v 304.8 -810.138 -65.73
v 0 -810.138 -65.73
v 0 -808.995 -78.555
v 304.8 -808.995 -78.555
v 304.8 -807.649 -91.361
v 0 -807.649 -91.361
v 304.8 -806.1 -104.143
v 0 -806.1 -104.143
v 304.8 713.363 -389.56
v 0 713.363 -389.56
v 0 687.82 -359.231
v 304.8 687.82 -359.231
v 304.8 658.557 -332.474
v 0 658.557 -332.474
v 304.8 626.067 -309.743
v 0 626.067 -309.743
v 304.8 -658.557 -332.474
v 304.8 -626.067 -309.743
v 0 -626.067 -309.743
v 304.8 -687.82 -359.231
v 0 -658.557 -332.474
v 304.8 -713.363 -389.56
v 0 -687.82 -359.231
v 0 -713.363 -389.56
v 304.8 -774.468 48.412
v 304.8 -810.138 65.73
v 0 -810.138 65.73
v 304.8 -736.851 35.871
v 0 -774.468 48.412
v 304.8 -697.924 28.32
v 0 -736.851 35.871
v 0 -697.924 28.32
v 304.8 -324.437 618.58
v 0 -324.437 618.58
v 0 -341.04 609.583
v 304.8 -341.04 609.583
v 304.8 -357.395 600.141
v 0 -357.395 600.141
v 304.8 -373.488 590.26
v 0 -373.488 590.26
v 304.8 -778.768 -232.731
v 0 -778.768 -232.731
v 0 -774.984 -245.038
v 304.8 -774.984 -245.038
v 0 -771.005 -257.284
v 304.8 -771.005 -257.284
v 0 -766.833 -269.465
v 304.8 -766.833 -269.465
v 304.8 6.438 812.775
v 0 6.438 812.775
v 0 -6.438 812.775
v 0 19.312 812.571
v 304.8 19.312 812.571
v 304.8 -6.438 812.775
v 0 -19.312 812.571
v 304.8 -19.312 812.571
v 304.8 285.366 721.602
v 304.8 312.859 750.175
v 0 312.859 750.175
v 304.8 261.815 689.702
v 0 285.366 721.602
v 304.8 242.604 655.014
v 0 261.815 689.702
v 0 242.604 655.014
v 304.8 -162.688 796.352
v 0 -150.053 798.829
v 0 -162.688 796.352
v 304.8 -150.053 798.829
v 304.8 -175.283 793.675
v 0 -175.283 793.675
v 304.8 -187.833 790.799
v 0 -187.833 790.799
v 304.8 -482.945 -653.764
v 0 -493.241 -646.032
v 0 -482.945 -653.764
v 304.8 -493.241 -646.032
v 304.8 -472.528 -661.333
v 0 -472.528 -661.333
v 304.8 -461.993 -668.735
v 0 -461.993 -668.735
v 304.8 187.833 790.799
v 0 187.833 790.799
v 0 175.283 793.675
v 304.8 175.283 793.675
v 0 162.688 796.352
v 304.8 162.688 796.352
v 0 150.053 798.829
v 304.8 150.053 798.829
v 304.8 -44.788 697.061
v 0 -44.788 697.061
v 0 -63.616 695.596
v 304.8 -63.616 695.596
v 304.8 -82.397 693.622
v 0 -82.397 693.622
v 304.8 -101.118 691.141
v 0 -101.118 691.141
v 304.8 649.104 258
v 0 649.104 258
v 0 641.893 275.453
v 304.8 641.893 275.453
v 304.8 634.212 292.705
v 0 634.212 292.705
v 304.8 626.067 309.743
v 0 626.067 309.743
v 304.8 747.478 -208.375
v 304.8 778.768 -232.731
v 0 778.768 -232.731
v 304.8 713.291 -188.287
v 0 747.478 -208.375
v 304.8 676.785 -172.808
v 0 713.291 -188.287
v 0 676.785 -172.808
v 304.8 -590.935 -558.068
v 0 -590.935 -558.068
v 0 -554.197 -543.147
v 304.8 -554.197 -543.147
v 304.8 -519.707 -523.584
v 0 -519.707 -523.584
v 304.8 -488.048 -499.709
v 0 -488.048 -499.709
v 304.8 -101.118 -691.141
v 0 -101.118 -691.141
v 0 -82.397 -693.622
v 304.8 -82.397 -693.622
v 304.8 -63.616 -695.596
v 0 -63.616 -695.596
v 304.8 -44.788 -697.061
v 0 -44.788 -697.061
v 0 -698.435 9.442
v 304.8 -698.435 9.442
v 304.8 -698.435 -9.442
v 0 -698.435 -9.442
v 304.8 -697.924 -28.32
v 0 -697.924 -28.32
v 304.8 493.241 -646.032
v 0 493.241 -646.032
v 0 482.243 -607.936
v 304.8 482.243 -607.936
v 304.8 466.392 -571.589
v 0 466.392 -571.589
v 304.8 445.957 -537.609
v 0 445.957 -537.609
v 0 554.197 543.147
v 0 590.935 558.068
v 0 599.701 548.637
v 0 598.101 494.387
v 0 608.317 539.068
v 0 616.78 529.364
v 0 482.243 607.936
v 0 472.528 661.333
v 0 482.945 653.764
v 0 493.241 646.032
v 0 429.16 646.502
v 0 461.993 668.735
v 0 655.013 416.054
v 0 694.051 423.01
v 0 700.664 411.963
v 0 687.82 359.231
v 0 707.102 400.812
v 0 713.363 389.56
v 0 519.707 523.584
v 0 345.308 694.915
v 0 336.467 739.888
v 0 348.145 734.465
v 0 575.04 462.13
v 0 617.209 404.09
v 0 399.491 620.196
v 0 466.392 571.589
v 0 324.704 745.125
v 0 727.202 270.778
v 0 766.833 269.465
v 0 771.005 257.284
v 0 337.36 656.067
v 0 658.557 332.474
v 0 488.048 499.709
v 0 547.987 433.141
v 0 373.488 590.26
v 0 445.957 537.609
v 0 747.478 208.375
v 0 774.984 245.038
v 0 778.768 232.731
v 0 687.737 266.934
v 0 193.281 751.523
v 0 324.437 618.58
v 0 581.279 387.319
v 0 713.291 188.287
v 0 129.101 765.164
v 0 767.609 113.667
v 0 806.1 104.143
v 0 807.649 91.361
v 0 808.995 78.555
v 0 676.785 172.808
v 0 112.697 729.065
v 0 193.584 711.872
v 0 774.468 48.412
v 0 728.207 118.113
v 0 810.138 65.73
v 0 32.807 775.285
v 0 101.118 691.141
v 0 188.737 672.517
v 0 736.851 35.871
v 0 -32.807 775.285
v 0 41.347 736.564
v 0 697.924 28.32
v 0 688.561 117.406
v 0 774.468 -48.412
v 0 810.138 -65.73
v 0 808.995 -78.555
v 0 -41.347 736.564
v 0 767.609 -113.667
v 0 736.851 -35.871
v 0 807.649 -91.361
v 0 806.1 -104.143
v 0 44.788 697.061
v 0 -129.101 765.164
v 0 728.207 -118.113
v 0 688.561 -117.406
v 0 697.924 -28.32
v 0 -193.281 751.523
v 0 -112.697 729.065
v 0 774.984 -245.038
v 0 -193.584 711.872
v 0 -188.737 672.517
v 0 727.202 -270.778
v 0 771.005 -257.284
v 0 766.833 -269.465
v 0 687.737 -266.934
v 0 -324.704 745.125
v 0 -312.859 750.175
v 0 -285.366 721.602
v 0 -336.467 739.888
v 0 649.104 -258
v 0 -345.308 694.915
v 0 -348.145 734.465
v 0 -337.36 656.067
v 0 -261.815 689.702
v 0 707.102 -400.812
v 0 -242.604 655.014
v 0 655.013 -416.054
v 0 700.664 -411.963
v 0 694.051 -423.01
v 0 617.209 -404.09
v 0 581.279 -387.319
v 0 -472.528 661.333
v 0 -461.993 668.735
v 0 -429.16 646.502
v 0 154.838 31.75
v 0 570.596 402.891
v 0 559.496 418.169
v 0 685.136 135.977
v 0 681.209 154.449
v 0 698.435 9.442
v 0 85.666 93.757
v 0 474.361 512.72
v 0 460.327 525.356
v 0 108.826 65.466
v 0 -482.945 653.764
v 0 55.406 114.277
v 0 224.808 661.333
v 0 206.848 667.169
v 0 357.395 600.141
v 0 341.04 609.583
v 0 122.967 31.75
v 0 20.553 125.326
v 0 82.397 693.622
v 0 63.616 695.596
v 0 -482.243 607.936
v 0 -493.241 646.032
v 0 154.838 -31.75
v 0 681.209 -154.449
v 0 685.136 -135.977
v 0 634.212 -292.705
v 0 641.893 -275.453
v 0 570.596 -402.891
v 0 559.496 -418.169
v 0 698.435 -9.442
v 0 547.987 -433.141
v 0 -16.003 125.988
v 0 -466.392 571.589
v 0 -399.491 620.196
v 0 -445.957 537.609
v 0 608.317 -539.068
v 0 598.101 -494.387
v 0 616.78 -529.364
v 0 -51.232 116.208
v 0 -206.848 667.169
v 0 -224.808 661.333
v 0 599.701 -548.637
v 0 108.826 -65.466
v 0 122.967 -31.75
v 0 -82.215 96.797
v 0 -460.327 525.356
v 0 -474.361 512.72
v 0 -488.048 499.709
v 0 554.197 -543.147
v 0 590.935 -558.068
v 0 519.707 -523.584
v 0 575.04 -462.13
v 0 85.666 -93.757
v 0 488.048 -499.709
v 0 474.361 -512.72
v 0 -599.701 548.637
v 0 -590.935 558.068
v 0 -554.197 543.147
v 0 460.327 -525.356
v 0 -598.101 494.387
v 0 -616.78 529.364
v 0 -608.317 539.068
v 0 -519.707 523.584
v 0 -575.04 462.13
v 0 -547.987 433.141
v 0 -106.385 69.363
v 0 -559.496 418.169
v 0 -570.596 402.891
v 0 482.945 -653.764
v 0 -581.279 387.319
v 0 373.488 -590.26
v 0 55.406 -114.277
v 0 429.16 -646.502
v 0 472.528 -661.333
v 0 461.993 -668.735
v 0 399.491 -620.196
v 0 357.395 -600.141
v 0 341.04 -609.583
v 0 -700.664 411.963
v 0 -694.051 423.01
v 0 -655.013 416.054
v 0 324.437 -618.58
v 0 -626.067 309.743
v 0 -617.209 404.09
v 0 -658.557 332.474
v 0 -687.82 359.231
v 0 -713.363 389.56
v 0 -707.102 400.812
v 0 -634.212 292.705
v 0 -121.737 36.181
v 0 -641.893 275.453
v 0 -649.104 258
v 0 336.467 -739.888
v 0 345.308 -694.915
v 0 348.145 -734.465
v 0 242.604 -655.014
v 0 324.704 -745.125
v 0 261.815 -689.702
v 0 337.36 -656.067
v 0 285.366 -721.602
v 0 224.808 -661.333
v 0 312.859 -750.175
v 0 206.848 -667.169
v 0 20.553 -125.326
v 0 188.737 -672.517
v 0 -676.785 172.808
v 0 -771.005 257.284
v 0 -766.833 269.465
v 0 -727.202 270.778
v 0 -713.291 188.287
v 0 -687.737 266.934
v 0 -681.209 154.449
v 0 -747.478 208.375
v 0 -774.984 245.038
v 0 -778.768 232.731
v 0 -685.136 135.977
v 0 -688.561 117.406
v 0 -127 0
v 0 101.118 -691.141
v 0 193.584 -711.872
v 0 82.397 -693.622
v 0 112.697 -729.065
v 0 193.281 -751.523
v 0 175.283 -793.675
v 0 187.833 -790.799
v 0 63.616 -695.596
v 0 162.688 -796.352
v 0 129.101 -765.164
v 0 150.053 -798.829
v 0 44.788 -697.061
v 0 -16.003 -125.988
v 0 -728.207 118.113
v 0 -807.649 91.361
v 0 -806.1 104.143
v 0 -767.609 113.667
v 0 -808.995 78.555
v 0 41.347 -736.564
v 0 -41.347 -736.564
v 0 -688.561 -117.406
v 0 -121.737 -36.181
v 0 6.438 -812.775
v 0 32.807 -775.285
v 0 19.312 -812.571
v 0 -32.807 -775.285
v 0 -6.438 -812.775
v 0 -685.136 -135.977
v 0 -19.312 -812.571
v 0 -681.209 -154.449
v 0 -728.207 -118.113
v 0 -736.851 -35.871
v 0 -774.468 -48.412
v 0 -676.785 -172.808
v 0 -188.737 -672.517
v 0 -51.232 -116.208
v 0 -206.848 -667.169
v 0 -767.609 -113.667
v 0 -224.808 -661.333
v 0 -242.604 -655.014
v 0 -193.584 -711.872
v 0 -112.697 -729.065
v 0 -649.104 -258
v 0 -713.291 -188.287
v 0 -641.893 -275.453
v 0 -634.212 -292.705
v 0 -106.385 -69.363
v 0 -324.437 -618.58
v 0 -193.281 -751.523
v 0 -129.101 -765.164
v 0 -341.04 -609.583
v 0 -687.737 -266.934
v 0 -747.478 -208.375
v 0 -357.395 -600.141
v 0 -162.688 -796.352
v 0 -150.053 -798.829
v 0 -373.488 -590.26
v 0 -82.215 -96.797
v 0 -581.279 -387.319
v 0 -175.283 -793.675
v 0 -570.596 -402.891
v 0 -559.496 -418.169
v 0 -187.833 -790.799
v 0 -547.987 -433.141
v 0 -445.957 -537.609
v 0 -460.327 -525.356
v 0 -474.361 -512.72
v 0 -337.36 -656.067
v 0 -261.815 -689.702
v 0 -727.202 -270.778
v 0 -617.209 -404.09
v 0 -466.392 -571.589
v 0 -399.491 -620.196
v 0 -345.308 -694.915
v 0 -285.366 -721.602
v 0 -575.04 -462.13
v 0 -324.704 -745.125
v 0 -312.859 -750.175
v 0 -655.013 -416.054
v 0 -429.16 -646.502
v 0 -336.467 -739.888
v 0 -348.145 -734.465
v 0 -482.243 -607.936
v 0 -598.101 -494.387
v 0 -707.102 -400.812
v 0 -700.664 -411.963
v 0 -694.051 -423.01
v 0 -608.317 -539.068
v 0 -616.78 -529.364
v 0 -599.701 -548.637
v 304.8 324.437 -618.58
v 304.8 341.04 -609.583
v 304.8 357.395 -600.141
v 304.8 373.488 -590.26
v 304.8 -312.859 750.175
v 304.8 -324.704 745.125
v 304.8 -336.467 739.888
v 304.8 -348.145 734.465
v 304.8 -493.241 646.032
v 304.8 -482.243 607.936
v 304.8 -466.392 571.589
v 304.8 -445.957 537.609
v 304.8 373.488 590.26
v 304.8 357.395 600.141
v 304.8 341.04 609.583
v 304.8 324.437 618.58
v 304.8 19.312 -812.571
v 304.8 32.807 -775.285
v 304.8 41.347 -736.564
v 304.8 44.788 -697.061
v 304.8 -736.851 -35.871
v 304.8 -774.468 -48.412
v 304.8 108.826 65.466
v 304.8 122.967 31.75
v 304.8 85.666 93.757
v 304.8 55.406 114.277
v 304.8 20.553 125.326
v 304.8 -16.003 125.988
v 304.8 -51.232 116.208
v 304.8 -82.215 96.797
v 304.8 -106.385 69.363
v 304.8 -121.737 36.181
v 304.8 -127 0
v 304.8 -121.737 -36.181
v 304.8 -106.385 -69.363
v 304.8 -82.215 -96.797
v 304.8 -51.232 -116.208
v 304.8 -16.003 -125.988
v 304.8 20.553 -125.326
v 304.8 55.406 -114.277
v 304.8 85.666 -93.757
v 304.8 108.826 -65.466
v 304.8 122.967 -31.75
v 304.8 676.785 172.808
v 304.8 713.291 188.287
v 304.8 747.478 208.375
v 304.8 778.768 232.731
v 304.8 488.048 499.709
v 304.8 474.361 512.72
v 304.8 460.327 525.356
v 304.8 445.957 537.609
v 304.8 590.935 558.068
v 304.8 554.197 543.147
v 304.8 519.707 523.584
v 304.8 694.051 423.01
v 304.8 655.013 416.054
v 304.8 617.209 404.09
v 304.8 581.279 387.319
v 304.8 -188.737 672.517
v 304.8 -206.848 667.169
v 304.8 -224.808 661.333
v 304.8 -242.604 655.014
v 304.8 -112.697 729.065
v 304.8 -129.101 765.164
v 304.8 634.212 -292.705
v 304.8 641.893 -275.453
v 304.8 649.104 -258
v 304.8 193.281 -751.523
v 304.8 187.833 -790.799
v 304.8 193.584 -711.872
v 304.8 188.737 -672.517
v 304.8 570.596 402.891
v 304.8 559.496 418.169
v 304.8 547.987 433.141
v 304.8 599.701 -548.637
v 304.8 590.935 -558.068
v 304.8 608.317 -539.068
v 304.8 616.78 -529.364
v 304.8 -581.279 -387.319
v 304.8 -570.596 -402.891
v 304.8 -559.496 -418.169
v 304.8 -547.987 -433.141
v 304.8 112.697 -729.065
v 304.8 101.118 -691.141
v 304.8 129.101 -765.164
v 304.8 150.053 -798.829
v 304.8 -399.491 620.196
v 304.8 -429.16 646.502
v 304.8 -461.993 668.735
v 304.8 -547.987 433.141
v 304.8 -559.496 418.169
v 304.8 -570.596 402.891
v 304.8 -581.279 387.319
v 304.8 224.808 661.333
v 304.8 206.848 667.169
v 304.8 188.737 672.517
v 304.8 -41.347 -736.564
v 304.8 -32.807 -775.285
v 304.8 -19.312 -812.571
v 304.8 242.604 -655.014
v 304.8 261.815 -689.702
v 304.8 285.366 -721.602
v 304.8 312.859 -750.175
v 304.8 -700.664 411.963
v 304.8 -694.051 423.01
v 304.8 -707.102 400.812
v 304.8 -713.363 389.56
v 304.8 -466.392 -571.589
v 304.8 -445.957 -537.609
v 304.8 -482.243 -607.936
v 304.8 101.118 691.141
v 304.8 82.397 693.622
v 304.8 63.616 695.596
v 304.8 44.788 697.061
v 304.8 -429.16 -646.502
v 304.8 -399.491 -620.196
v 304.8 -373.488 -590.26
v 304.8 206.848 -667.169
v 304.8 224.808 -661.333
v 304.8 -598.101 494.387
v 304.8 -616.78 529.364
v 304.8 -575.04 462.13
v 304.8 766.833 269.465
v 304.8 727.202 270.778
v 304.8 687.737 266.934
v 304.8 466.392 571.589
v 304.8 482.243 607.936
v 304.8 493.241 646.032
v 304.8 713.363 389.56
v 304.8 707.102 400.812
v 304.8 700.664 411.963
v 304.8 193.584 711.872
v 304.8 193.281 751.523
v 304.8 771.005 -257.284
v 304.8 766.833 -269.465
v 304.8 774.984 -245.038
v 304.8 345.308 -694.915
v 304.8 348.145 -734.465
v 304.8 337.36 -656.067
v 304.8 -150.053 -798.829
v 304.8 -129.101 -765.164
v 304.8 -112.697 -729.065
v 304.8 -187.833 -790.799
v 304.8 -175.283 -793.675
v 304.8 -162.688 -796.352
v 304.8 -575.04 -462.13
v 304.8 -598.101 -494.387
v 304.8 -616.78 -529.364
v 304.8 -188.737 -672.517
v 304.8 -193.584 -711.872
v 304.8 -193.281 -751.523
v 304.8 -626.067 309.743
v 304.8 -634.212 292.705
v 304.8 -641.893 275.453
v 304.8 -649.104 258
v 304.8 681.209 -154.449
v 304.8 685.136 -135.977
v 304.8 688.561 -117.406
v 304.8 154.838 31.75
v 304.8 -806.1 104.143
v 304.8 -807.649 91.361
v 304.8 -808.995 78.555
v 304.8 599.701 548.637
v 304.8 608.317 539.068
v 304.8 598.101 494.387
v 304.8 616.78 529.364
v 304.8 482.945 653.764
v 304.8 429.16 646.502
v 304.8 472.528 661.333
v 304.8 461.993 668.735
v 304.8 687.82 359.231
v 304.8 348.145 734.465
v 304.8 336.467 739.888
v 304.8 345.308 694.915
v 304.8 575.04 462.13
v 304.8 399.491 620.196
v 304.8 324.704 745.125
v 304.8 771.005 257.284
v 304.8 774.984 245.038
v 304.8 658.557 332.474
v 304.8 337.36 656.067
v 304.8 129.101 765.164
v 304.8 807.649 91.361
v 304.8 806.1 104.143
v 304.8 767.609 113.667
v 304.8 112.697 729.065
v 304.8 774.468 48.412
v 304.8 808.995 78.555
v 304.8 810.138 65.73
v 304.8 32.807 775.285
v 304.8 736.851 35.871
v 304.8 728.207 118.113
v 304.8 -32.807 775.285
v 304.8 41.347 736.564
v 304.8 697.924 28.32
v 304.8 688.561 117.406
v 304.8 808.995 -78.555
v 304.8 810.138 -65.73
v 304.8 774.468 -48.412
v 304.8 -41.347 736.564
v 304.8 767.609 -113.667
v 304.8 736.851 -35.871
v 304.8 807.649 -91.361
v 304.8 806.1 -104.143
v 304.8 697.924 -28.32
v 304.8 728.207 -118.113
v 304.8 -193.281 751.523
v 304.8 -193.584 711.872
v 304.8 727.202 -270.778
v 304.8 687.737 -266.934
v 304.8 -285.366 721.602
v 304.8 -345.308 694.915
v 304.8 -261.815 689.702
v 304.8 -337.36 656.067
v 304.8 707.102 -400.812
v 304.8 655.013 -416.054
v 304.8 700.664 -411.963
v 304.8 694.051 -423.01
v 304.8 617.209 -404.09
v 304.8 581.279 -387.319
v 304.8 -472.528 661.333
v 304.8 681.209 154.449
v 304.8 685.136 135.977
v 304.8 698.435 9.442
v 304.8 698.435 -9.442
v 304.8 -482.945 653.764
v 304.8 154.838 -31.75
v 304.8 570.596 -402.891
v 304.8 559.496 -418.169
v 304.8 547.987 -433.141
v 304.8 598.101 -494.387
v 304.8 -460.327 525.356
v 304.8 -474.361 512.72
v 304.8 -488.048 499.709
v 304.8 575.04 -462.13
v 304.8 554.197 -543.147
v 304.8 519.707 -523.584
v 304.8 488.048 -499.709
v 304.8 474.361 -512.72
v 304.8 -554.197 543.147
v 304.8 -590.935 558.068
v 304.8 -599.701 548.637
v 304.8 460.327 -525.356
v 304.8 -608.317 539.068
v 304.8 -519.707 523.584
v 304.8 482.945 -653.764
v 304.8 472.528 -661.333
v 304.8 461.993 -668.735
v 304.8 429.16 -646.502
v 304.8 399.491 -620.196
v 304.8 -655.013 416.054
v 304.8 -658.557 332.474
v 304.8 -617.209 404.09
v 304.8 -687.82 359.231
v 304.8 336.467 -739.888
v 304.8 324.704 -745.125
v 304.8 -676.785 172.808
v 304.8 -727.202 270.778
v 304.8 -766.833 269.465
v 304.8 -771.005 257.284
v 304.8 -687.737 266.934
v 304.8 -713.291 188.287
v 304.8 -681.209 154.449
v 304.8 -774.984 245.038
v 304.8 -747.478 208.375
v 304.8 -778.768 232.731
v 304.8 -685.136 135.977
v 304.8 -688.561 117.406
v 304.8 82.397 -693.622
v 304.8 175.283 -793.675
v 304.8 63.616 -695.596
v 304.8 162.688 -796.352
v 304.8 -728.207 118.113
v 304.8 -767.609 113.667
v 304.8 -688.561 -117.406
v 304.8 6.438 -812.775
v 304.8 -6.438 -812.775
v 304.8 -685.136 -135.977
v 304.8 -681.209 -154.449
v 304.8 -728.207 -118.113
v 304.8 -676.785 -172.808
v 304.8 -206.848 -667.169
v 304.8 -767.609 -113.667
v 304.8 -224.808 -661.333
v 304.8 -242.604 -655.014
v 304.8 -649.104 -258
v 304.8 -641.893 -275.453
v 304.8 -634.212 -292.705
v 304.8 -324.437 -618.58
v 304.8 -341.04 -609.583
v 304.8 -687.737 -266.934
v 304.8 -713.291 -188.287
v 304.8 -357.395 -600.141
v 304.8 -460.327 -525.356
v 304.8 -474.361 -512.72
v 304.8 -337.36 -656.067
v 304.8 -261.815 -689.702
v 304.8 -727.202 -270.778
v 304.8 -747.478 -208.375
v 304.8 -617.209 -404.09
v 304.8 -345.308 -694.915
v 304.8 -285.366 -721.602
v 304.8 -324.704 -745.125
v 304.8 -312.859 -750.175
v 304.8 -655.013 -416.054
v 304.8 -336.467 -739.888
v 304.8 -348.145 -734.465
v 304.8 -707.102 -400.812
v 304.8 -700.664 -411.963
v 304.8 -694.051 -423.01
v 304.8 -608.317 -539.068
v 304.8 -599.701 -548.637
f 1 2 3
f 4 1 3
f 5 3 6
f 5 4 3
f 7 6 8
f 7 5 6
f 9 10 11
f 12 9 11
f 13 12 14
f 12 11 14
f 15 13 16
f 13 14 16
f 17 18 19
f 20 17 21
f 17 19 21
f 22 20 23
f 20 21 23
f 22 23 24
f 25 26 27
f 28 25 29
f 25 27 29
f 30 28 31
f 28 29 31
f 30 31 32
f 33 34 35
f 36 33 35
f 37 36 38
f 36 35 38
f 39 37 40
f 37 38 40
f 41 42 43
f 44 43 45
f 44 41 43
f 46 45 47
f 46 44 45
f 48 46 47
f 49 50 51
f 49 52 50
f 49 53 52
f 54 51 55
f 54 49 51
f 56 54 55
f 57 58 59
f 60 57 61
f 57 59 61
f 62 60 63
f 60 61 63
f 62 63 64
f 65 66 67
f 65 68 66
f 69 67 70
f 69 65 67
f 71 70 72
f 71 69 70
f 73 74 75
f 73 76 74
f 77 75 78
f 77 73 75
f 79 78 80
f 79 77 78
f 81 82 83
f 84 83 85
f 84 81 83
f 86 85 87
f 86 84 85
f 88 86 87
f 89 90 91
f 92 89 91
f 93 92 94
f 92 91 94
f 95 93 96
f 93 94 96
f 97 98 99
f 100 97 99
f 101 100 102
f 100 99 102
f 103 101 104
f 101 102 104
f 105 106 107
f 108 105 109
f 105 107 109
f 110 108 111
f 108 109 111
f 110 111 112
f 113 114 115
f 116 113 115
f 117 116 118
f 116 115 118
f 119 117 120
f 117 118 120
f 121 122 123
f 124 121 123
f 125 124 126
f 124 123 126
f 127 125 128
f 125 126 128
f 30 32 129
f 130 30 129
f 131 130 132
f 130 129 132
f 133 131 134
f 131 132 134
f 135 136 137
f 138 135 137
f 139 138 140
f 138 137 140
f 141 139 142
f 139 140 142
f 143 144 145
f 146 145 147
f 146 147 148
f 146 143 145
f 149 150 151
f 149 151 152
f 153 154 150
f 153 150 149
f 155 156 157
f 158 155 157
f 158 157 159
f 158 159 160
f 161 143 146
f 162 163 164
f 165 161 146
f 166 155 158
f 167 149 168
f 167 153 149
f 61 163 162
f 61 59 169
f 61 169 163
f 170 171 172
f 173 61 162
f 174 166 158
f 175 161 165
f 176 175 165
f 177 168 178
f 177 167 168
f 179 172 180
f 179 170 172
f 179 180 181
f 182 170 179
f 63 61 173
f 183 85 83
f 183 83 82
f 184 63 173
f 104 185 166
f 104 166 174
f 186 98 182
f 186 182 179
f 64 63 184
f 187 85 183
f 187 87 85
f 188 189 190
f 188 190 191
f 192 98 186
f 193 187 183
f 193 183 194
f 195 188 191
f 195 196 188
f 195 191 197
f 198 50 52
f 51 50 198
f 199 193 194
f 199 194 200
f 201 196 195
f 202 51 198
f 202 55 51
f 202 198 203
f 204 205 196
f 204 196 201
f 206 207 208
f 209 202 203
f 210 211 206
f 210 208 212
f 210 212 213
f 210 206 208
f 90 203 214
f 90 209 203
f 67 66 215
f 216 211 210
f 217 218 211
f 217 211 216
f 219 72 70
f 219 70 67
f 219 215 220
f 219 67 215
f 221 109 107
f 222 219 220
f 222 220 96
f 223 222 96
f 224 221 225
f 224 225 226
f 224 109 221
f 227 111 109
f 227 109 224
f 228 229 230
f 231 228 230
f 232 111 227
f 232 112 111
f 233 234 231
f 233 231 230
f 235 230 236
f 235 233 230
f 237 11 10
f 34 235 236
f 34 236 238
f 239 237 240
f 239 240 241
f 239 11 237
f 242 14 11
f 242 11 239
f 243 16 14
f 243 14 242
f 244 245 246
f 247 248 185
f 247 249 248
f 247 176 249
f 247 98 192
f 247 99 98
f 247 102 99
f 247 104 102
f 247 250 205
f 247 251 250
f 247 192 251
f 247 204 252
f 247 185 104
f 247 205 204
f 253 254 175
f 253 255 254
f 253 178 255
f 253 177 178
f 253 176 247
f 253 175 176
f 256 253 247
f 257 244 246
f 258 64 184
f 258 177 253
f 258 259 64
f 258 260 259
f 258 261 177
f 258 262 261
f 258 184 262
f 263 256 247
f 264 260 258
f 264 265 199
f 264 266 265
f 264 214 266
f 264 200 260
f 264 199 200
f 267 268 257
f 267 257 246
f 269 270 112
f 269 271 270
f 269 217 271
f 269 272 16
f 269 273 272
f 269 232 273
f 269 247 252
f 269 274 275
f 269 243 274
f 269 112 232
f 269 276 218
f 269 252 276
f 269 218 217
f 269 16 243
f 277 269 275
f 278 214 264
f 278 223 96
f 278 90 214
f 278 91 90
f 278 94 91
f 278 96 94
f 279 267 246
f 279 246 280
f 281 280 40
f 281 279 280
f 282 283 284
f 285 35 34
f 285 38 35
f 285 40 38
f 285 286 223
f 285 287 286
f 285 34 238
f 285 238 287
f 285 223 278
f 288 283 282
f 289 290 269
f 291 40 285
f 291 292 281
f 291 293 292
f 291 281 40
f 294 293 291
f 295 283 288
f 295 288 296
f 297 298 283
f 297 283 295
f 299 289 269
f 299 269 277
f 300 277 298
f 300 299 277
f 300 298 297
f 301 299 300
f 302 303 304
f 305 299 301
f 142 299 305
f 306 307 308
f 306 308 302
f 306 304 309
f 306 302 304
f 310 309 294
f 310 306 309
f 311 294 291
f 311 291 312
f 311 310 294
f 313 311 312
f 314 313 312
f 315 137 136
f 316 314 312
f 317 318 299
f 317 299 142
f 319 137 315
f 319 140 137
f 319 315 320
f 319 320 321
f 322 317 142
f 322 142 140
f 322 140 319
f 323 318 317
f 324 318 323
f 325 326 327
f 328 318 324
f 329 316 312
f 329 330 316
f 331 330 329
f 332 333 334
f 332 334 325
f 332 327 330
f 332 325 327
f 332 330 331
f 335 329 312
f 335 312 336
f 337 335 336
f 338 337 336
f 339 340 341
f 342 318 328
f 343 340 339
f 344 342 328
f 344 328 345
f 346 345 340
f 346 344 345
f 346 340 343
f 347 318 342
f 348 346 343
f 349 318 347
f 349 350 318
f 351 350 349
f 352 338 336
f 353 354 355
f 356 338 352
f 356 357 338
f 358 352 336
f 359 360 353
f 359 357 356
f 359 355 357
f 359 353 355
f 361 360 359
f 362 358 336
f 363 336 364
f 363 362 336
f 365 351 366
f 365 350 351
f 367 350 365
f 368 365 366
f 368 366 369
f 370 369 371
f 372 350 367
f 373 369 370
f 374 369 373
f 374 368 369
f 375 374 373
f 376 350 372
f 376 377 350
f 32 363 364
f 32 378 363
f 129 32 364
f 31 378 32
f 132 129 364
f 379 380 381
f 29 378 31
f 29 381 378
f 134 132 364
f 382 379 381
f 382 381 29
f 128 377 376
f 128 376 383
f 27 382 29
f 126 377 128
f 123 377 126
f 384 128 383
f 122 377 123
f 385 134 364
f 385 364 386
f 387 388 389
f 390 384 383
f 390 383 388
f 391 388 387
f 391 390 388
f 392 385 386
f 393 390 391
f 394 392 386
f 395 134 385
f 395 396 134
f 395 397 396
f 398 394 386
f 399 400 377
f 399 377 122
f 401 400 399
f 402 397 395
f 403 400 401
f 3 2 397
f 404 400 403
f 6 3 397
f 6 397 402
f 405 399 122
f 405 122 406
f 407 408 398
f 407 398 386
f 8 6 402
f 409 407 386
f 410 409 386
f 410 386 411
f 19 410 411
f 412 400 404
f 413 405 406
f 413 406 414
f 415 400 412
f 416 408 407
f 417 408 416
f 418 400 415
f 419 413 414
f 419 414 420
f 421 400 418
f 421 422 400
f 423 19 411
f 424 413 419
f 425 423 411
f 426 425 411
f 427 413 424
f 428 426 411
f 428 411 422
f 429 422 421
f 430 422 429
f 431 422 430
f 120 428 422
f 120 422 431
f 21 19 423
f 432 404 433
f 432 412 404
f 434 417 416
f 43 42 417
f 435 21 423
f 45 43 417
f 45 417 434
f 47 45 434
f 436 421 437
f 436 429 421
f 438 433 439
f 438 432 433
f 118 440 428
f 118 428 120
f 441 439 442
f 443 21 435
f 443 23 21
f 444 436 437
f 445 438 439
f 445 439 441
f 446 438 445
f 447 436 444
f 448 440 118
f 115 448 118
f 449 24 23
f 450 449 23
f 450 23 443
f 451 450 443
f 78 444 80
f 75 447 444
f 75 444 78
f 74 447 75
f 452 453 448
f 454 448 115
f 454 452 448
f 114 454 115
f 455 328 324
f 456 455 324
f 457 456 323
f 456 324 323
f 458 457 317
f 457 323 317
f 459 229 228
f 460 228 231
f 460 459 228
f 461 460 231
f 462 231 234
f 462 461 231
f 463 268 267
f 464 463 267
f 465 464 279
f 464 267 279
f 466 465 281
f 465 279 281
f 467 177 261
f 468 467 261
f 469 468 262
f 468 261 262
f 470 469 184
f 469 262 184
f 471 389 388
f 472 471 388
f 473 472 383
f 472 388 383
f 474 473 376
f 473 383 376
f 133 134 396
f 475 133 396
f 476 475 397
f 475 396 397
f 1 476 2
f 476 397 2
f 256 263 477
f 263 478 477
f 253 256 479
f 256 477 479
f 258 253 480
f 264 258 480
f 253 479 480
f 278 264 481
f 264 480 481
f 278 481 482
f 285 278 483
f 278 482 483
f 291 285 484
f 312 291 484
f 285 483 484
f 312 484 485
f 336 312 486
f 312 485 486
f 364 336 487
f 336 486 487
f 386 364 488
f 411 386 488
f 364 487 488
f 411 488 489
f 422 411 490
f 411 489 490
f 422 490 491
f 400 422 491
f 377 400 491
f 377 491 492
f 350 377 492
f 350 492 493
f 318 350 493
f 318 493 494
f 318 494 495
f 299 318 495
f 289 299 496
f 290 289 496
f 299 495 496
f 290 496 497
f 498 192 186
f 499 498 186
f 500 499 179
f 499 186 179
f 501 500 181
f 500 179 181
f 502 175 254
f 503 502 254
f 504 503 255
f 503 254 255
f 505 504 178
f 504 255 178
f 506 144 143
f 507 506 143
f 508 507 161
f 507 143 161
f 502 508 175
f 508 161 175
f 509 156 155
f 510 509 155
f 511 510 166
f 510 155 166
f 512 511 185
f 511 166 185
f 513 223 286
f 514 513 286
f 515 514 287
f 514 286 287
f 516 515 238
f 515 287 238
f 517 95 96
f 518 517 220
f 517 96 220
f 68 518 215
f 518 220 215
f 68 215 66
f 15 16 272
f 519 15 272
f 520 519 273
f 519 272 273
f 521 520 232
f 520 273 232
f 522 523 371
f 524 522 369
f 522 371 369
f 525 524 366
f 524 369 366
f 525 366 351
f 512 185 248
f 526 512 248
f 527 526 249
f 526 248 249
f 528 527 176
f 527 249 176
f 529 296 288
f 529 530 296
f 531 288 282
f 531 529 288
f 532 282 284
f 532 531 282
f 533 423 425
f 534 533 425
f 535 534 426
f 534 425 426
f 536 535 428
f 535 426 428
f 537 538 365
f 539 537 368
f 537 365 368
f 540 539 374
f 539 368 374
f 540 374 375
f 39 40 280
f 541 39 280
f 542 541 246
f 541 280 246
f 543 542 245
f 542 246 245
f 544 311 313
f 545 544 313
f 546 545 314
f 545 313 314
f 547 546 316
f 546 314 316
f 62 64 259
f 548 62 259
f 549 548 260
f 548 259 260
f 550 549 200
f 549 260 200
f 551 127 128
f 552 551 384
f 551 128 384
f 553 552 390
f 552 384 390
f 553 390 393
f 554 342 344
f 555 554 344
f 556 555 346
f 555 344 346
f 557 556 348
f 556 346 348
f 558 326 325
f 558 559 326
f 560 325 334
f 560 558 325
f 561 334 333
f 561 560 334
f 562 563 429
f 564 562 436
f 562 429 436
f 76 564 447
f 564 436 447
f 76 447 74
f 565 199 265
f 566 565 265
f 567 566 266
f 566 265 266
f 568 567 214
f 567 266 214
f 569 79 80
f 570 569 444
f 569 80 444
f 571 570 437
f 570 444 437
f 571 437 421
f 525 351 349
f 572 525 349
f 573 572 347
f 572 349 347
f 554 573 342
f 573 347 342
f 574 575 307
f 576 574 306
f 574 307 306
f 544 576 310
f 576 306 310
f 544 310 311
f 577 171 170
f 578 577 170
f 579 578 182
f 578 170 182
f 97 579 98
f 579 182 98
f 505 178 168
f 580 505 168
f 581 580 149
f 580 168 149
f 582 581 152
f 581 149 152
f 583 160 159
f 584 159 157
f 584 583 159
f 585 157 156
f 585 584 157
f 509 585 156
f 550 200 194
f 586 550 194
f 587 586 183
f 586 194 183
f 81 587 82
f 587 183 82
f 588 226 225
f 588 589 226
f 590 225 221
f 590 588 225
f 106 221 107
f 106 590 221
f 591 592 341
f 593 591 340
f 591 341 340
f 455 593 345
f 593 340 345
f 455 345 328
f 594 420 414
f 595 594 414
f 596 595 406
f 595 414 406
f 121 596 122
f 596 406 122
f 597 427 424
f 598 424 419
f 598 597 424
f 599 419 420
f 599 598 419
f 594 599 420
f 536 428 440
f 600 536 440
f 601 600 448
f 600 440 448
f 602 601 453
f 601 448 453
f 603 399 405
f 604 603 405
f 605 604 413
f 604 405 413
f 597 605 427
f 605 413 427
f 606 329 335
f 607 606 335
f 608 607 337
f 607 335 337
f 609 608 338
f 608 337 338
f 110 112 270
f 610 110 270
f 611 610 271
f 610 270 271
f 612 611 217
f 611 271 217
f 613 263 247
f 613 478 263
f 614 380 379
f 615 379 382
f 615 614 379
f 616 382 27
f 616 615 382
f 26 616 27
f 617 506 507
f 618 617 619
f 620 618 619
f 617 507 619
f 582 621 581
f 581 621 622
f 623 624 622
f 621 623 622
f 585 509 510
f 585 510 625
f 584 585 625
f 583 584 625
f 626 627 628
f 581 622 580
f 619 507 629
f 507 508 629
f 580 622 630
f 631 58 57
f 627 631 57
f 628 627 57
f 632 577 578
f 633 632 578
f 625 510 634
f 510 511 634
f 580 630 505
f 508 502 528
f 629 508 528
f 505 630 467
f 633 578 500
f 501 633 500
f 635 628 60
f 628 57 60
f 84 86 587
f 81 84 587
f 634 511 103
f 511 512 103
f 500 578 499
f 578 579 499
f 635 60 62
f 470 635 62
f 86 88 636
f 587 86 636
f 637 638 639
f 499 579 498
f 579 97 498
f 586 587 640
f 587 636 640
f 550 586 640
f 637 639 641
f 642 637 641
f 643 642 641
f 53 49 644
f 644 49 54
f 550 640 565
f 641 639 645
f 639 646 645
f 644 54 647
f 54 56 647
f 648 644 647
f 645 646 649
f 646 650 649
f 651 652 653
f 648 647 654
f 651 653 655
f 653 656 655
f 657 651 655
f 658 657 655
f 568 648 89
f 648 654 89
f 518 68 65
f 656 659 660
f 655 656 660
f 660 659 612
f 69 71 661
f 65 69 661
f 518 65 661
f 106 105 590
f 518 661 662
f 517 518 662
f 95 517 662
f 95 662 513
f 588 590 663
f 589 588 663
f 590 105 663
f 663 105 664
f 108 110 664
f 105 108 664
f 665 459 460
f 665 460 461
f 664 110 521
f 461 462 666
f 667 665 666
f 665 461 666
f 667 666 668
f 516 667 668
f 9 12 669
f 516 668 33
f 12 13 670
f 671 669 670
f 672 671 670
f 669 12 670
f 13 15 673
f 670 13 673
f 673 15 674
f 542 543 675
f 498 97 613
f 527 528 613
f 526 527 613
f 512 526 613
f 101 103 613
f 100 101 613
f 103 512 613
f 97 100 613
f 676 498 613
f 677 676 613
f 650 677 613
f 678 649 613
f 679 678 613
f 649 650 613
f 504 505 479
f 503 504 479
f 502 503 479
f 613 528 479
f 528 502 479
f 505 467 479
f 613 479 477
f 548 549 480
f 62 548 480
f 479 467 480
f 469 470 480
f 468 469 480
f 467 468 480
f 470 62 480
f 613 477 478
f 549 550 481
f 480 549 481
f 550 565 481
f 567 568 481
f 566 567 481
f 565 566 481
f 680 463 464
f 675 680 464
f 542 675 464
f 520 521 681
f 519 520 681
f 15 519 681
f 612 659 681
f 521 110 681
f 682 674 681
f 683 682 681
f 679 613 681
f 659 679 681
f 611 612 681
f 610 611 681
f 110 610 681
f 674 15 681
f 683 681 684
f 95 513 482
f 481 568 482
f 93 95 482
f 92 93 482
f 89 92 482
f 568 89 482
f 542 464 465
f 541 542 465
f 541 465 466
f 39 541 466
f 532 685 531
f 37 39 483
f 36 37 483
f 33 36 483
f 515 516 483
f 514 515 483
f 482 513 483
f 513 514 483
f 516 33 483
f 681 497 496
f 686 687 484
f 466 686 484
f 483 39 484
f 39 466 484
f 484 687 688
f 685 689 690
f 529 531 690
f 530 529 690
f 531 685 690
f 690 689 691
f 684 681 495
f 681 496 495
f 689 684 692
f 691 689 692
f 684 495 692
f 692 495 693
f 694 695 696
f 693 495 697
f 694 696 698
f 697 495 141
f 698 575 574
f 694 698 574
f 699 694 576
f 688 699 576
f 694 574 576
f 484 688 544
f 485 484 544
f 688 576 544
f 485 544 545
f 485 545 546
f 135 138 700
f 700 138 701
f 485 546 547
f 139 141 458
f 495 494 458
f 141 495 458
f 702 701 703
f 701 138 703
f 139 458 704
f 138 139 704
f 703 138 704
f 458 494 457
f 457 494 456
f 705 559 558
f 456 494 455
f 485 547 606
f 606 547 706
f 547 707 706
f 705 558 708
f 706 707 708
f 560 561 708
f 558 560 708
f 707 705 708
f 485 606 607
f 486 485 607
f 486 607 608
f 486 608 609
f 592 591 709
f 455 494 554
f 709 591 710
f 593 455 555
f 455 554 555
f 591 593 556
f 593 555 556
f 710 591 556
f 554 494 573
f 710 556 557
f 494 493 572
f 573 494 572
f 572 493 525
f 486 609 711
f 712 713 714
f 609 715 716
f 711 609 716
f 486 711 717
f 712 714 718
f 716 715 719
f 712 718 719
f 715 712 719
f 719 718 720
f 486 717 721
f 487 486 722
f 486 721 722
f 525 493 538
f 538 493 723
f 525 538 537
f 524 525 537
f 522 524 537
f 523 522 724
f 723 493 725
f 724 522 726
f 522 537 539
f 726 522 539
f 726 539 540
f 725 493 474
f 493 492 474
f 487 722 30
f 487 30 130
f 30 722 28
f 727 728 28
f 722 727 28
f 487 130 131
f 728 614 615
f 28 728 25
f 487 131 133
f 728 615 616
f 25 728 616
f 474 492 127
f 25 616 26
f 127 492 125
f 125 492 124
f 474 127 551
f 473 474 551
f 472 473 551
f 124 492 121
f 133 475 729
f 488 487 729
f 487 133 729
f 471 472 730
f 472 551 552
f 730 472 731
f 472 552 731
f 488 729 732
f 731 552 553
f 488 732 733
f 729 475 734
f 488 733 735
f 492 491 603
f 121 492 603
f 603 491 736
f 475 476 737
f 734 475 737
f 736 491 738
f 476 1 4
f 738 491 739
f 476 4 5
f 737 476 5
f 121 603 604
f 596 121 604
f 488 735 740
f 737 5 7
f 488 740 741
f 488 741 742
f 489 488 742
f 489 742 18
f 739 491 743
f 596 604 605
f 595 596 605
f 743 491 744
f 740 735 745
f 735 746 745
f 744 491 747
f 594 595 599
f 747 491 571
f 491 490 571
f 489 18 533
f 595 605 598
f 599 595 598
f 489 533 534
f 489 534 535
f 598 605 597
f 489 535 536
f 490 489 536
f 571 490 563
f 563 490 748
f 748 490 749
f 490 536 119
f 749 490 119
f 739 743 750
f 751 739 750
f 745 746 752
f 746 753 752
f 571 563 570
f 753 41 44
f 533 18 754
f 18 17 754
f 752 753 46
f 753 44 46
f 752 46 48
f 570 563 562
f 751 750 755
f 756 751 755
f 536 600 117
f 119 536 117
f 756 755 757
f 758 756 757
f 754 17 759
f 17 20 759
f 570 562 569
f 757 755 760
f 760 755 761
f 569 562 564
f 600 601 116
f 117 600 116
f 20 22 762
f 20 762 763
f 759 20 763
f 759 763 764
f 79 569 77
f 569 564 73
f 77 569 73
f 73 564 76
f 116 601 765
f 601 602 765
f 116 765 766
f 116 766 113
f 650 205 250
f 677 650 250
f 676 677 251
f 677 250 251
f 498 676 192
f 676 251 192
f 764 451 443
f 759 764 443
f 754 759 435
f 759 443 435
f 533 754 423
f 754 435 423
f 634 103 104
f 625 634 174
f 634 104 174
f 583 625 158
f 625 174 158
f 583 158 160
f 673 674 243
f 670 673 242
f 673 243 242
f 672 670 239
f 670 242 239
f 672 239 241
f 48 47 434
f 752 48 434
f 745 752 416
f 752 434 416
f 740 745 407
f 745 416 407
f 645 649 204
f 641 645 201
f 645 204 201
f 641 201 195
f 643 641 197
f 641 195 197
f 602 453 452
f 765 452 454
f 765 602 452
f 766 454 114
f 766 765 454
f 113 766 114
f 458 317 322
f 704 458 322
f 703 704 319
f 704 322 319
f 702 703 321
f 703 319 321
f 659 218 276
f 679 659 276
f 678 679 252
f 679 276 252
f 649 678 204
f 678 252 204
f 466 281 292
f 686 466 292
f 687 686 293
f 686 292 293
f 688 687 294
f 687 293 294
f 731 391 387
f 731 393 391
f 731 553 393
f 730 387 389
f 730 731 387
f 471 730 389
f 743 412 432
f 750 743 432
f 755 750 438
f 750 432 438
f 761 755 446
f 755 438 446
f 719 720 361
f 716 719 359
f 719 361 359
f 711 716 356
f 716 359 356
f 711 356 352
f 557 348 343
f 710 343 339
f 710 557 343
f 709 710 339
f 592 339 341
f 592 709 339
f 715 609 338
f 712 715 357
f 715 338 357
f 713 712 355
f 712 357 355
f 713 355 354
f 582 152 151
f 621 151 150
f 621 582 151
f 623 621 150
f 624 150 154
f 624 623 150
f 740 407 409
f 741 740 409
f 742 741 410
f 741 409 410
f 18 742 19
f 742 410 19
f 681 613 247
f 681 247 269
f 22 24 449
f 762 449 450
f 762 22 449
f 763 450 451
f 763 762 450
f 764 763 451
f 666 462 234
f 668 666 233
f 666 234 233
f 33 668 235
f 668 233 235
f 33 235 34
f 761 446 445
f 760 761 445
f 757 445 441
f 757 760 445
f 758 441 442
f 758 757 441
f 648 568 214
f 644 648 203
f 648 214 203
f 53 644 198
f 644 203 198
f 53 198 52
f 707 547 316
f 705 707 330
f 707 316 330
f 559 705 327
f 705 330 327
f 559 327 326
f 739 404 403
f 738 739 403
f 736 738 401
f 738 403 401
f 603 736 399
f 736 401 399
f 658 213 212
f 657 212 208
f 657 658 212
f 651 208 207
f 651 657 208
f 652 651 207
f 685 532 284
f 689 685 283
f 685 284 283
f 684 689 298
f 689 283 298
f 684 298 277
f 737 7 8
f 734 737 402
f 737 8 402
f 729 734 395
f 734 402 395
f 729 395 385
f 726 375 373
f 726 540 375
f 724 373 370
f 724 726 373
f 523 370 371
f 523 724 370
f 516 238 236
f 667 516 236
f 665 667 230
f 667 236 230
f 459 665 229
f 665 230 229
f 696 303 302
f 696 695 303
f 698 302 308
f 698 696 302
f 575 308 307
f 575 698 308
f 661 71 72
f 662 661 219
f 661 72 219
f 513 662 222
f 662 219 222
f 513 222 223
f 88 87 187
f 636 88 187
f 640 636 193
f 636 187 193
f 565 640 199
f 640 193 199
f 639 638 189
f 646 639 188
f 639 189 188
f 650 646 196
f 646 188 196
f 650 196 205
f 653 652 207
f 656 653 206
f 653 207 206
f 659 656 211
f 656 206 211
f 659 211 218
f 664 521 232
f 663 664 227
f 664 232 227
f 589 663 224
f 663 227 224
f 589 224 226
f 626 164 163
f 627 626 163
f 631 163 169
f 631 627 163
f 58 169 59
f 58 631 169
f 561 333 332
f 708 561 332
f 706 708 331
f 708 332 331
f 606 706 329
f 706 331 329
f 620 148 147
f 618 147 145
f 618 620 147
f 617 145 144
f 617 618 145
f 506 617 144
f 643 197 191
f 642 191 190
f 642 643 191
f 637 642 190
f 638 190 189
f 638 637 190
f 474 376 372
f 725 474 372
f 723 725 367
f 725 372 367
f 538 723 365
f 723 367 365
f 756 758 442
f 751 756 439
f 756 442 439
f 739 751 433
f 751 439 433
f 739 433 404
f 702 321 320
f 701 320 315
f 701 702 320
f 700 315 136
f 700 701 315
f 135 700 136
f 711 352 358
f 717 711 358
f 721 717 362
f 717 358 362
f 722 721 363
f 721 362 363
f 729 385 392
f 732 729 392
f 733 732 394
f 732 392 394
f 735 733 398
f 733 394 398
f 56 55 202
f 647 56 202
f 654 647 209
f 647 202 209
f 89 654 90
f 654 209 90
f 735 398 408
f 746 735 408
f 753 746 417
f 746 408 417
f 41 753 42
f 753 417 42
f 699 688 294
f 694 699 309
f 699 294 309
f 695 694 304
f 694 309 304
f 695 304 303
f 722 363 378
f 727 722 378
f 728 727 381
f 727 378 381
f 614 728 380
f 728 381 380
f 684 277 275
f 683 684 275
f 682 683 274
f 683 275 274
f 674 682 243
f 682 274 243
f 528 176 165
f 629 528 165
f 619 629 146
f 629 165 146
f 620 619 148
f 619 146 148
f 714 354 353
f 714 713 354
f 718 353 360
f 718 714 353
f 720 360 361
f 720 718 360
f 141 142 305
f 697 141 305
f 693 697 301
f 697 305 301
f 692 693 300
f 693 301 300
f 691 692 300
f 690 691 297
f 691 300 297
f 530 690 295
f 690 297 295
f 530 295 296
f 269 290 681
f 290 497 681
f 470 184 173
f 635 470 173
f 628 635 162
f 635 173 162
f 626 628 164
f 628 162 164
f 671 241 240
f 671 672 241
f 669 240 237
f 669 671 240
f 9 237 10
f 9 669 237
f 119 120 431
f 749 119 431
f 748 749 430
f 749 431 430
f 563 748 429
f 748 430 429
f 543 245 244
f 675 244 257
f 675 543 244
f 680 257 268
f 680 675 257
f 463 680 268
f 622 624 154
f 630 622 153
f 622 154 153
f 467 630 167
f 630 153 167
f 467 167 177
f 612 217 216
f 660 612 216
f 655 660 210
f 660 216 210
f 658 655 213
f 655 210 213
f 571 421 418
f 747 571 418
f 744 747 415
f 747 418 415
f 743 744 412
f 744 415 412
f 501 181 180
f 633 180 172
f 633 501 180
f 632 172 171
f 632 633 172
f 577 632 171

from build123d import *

# Parameters (mm, degrees)
BASPROSKE_W     = 304.8
BASPROSKE_H     = 812.8
TOOTHCUT_DEPTH  = 1190.197510929
TEETHCUTS_COUNT = 30
TEETHCUTS_ANGLE = 348
BORSKE_R        = 127
BORE_DEPTH      = 304.8000508
KEYSKE_W        = 63.5
KEYSKE_H        = 154.8384
KEYWAY_DEPTH    = 304.8000508


with BuildPart() as part:
    # BasProSke → Base-Revolve (revolve)
    with BuildSketch(Plane(origin=(0, 0, 0), x_dir=(1, 0, 0), z_dir=(0, 1, 0)), mode=Mode.PRIVATE) as base_revolve_sk:
        with Locations((152.4, 406.4)):
            Rectangle(BASPROSKE_W, BASPROSKE_H)
    revolve(base_revolve_sk.sketch.rotate(Axis((-10, 0, 0), (1, 0, 0)), 180), axis=Axis((-10, 0, 0), (1, 0, 0)))

    # TooCutSke → ToothCut (cut, through all)
    with BuildSketch(Plane(origin=(0, 0, 0), x_dir=(0, 0, -1), z_dir=(1, 0, 0))):
        with BuildLine():
            ThreePointArc((28.319737367, 697.924400123), (0, 698.49873), (-28.319737367, 697.924400123))
            ThreePointArc((-28.319737367, 697.924400123), (-41.533758507, 755.876600482), (-65.744032335, 810.162238751))
            ThreePointArc((-65.744032335, 810.162238751), (0, 812.8254), (65.744032335, 810.162238751))
            ThreePointArc((65.744032335, 810.162238751), (41.533758507, 755.876600482), (28.319737367, 697.924400123))
        make_face()
    toothcut = extrude(amount=TOOTHCUT_DEPTH, mode=Mode.SUBTRACT)

    # TeethCuts: ToothCut ×30 about axis
    teethcuts_axis = Axis((-10, 0, 0), (1, 0, 0))
    for i in range(1, TEETHCUTS_COUNT):
        add(toothcut.rotate(teethcuts_axis, i * TEETHCUTS_ANGLE / (TEETHCUTS_COUNT - 1)), mode=Mode.SUBTRACT)

    # BorSke → Bore (cut, symmetric)
    with BuildSketch(Plane(origin=(0, 0, 0), x_dir=(0, 0, -1), z_dir=(1, 0, 0))):
        with Locations(Location((0, 0, 0), (0, 0, 180))):
            Circle(BORSKE_R)
    extrude(amount=BORE_DEPTH, both=True, mode=Mode.SUBTRACT)

    # KeySke → Keyway (cut, symmetric)
    with BuildSketch(Plane(origin=(0, 0, 0), x_dir=(0, 0, -1), z_dir=(1, 0, 0))):
        with Locations((0, 77.4192)):
            Rectangle(KEYSKE_W, KEYSKE_H)
    extrude(amount=KEYWAY_DEPTH, both=True, mode=Mode.SUBTRACT)


solid = part.part
